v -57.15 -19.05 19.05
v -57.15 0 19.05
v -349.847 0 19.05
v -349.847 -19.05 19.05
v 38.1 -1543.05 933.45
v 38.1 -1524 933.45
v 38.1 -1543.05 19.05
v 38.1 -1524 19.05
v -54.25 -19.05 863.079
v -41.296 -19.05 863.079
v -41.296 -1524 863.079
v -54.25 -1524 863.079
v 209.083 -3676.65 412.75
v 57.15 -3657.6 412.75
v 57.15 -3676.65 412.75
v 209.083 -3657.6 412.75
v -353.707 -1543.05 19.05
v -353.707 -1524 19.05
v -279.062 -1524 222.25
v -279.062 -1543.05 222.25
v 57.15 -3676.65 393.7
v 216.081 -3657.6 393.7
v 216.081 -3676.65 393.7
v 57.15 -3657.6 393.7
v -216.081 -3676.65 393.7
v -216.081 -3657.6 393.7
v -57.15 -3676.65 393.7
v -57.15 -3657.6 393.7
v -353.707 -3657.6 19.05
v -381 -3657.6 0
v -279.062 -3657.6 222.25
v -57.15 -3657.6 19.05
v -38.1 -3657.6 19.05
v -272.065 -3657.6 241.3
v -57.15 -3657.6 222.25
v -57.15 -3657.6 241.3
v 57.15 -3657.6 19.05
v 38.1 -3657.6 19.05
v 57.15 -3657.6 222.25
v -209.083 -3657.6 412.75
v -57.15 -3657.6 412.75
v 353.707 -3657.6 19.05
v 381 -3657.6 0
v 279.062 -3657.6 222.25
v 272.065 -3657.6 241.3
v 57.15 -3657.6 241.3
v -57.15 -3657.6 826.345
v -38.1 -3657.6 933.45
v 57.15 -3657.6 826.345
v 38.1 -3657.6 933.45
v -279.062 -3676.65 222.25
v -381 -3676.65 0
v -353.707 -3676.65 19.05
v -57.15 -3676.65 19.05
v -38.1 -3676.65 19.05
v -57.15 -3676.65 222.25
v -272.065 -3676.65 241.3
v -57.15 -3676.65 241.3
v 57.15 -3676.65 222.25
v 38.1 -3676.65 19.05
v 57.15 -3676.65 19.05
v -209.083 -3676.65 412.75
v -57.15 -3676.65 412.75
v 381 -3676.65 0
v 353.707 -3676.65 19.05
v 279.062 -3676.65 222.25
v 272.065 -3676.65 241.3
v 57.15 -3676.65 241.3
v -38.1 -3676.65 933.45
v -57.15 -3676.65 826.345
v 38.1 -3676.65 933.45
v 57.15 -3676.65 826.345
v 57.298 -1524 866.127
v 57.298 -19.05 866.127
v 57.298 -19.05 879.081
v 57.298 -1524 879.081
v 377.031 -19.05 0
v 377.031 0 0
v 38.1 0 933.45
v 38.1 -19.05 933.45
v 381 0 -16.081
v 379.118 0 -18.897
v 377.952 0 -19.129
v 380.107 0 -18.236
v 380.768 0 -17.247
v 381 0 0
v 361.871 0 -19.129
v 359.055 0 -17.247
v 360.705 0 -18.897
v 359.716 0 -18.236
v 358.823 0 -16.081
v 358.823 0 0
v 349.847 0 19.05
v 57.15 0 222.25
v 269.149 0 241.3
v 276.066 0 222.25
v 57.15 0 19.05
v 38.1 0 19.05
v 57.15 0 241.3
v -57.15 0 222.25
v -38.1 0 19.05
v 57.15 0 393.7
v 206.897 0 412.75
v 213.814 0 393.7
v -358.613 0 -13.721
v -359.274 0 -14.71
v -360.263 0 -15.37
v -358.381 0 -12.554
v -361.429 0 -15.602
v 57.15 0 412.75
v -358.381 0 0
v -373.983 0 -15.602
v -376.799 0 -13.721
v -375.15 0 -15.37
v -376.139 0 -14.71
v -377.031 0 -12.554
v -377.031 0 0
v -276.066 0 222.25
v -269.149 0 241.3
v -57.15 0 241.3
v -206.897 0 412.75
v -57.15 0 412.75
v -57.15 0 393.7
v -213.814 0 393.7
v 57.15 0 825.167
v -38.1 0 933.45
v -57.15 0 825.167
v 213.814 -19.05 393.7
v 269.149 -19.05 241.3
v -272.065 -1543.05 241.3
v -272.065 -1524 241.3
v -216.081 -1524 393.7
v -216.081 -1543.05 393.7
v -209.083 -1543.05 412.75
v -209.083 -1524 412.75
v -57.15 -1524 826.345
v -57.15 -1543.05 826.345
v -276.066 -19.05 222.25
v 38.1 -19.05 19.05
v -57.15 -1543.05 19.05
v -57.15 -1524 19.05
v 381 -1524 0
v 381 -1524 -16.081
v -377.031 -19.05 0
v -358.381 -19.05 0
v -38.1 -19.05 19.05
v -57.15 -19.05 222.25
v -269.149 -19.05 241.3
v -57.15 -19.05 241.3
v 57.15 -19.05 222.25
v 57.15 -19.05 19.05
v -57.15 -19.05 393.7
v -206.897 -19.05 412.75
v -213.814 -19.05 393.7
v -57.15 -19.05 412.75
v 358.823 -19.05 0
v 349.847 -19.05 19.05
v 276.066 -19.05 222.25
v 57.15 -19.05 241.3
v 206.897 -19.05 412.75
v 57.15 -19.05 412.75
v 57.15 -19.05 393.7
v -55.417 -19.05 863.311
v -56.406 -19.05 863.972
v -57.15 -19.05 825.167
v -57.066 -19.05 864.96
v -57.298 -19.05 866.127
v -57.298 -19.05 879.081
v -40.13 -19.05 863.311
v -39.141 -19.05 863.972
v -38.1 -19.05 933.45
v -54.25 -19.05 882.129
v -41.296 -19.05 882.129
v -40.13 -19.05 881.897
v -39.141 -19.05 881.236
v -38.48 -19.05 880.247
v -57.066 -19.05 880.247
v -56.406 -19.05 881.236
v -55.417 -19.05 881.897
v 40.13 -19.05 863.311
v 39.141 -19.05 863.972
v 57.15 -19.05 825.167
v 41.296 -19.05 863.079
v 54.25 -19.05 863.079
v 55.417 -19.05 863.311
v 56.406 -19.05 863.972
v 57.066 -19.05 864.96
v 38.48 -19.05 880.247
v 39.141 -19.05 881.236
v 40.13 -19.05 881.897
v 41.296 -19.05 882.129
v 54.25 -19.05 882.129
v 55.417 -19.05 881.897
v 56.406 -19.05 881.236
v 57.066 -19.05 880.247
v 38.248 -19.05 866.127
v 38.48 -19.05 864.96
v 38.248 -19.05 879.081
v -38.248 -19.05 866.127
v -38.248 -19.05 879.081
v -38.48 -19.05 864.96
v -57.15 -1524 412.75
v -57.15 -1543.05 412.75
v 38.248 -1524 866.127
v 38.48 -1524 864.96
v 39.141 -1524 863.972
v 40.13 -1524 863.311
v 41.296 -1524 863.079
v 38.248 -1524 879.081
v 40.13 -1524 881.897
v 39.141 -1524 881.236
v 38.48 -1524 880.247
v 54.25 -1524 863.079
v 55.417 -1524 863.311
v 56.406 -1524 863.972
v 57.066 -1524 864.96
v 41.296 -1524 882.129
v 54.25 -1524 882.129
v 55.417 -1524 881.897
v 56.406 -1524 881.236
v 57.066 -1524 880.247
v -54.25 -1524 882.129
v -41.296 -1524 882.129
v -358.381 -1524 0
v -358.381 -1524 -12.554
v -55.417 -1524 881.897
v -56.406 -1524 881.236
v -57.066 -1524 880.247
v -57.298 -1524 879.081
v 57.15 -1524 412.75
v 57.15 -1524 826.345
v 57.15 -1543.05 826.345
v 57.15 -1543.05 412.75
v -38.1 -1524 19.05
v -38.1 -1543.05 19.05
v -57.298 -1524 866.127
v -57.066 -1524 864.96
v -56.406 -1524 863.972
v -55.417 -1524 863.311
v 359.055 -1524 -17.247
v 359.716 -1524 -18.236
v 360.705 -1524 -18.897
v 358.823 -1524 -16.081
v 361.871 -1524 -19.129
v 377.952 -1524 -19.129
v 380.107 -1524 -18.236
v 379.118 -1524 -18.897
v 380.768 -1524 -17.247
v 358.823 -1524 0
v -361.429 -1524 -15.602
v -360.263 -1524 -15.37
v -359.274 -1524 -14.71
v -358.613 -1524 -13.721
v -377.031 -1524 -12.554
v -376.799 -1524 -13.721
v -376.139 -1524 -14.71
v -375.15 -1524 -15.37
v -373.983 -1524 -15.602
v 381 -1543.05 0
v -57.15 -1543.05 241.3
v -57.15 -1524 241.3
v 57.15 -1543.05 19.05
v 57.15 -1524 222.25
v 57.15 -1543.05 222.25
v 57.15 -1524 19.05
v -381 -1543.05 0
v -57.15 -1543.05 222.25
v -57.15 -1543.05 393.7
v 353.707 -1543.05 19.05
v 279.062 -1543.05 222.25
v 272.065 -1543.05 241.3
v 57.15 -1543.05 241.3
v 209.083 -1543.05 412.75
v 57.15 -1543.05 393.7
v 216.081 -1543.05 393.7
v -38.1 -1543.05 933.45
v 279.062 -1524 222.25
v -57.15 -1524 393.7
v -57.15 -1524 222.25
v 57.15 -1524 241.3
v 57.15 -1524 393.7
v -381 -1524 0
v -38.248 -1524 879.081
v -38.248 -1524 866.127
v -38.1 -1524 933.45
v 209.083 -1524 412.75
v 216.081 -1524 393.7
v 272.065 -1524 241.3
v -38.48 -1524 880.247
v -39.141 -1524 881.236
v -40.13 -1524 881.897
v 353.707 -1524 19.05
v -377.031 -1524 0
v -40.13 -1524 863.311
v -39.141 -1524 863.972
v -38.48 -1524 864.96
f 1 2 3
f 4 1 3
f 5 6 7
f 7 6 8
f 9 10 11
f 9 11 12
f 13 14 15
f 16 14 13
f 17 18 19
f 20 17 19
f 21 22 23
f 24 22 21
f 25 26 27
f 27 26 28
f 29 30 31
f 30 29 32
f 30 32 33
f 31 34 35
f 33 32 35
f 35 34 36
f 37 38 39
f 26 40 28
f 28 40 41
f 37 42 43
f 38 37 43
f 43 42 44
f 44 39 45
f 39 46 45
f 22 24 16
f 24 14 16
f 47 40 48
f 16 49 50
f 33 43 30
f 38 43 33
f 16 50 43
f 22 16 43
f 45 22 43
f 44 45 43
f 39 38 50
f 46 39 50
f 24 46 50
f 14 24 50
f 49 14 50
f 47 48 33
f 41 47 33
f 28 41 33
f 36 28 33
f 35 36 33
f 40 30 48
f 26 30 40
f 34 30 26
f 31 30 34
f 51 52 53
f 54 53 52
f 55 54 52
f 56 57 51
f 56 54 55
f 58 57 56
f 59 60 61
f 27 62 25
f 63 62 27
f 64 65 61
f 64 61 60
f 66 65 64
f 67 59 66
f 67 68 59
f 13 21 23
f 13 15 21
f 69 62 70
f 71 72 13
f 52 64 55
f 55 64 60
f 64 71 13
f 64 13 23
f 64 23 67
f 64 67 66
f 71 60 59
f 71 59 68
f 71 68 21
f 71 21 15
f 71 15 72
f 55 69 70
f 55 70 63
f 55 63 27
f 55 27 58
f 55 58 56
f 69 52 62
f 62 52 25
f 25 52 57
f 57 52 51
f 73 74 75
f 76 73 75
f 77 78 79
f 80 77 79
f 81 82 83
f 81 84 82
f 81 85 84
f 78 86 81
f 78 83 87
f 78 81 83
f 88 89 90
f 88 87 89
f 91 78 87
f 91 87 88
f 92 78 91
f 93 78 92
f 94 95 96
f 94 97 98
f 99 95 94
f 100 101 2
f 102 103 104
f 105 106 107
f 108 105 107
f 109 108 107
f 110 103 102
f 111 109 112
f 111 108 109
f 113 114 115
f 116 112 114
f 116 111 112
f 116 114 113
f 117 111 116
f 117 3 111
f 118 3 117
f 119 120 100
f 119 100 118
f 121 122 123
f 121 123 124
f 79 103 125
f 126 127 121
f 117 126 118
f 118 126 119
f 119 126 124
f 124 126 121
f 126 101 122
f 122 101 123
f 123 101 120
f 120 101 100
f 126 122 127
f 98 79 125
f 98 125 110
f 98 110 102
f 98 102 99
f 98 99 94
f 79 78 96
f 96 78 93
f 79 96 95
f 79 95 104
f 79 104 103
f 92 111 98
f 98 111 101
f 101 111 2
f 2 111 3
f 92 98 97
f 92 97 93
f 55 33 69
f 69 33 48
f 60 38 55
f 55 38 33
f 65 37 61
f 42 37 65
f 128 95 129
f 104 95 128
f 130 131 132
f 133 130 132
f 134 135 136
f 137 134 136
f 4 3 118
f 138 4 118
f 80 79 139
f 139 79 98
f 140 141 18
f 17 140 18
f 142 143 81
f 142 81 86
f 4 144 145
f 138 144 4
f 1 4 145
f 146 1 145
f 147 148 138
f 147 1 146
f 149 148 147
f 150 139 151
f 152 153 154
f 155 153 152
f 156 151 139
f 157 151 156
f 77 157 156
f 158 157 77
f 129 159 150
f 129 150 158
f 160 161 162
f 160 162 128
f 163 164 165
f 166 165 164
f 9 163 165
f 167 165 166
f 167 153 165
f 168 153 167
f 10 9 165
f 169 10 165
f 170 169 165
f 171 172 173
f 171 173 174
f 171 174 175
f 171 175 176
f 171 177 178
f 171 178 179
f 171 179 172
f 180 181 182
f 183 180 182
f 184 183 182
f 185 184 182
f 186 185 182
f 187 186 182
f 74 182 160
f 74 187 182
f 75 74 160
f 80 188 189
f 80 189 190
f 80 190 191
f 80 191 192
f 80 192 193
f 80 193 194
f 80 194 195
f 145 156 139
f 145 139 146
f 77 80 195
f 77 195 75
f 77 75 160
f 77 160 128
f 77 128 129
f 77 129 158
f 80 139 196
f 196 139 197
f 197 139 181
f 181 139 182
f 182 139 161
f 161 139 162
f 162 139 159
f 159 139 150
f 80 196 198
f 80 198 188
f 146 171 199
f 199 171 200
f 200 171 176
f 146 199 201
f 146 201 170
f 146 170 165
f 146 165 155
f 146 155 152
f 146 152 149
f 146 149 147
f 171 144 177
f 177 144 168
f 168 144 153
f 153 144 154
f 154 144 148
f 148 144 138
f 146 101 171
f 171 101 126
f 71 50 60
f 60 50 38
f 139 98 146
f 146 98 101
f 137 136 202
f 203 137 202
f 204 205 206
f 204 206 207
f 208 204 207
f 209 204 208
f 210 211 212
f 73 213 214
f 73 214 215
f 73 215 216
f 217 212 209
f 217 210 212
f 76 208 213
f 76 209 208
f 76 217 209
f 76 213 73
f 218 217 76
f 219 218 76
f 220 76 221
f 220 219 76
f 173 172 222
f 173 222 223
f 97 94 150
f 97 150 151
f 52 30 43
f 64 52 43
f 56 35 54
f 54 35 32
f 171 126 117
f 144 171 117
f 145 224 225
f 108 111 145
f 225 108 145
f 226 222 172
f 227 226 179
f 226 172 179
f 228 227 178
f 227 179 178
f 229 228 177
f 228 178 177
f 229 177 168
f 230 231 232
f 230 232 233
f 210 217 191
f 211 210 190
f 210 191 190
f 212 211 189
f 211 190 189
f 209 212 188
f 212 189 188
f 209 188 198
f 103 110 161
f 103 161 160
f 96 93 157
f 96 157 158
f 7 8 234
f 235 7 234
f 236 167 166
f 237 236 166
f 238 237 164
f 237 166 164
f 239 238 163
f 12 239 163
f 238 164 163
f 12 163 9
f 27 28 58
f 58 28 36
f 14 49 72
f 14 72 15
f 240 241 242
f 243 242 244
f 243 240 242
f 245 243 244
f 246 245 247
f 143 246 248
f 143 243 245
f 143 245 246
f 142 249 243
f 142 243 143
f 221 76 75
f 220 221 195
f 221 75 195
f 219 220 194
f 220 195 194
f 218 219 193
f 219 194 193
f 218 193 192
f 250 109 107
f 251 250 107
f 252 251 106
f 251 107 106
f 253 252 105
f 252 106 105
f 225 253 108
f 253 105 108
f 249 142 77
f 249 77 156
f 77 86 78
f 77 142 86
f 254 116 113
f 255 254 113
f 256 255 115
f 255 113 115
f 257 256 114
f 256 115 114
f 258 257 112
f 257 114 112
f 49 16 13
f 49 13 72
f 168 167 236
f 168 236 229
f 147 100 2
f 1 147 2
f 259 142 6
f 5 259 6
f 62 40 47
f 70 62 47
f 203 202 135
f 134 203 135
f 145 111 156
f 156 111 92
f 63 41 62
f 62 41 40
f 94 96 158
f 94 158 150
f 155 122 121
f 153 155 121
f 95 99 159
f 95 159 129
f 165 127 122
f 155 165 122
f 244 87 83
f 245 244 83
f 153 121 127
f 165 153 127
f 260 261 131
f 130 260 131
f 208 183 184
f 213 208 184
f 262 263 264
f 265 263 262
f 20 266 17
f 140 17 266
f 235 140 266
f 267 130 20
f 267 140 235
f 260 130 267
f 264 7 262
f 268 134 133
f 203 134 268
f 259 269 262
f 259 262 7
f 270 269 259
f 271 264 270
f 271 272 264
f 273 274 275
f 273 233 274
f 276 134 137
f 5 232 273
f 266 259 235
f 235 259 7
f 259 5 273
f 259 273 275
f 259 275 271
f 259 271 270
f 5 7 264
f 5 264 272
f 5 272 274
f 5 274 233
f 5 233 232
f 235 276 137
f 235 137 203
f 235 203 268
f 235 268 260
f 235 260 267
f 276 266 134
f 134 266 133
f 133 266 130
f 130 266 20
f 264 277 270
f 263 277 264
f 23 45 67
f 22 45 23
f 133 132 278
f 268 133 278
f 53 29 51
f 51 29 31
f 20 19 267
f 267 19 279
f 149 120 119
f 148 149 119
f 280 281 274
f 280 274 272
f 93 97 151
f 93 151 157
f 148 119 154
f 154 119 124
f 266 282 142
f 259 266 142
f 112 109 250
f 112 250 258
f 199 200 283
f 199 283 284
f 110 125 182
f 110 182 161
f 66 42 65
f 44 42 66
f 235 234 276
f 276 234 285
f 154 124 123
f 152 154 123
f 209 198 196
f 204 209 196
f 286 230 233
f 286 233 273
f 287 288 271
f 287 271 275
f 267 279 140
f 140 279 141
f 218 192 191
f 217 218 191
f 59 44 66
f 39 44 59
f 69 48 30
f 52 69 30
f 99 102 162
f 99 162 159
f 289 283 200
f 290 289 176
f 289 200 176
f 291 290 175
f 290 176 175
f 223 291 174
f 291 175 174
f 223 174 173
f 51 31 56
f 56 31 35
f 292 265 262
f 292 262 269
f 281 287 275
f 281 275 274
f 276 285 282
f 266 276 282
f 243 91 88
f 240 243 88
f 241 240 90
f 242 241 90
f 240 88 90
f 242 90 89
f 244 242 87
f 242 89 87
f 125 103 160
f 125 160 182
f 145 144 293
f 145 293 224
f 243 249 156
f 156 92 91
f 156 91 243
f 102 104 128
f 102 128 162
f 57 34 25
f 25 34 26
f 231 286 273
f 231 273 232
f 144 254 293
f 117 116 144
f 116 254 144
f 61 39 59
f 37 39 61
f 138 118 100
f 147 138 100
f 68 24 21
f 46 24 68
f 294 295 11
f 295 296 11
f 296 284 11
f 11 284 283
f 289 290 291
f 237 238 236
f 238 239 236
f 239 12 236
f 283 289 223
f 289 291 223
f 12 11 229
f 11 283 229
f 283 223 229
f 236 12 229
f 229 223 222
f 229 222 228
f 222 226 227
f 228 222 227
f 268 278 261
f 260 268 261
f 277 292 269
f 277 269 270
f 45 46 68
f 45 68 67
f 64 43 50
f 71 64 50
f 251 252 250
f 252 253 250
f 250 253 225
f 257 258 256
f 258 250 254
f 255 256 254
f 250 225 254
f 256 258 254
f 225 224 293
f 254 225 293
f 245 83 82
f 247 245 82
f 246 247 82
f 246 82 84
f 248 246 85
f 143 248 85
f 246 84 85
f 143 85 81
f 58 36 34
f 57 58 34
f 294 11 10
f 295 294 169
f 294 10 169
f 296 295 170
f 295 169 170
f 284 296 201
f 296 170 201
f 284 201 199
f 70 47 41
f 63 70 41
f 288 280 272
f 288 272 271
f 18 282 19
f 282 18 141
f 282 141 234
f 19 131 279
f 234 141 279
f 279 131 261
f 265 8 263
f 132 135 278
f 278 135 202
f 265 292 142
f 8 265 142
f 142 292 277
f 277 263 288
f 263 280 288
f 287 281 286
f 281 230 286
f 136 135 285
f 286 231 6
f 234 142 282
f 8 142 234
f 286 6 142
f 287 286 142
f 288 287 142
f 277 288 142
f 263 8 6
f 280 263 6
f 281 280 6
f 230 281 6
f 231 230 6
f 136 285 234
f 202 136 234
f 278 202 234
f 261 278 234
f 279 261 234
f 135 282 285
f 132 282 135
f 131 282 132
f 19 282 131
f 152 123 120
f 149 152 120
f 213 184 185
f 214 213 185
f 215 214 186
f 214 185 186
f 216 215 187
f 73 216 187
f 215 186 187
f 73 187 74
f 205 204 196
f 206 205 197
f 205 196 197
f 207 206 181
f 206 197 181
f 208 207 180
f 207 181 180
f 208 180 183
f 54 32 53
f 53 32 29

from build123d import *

# Parameters (mm, degrees)
PAD_DEPTH    = 19.05
PAD003_DEPTH = 1524
PAD001_DEPTH = 19.05
PAD002_DEPTH = 19.05


with BuildPart() as body:
    # Sketch → Pad (new body)
    with BuildSketch(Plane.XZ):
        Polygon((-377.03125, 0), (377.03125, 0), (38.1, 933.45), (38.1, 19.05), (-38.1, 19.05), (-38.1, 933.45), align=None)
        Polygon((-276.066442, 222.25), (-57.15, 222.25), (-57.15, 19.05), (-349.847394, 19.05), align=None, mode=Mode.SUBTRACT)
        Polygon((-269.149477, 241.3), (-213.813763, 393.7), (-57.15, 393.7), (-57.15, 241.3), align=None, mode=Mode.SUBTRACT)
        Polygon((-206.896799, 412.75), (-57.15, 825.167413), (-57.15, 412.75), align=None, mode=Mode.SUBTRACT)
        Polygon((57.15, 19.05), (349.847394, 19.05), (276.066442, 222.25), (57.15, 222.25), align=None, mode=Mode.SUBTRACT)
        Polygon((57.15, 241.3), (269.149477, 241.3), (213.813763, 393.7), (57.15, 393.7), align=None, mode=Mode.SUBTRACT)
        Polygon((57.15, 412.75), (206.896799, 412.75), (57.15, 825.167413), align=None, mode=Mode.SUBTRACT)
    extrude(amount=PAD_DEPTH)

    # Sketch003 → Pad003 (join)
    with BuildSketch(Plane.XZ):
        with BuildLine():
            Line((-377.03125, 0), (-358.380943, 0))
            Line((-358.380943, 0), (-358.380943, -12.554307))
            ThreePointArc((-361.428943, -15.602307), (-359.273682, -14.709568), (-358.380943, -12.554307))
            Line((-361.428943, -15.602307), (-373.98325, -15.602307))
            ThreePointArc((-377.03125, -12.554307), (-376.138511, -14.709568), (-373.98325, -15.602307))
            Line((-377.03125, -12.554307), (-377.03125, 0))
        make_face()
        with BuildLine():
            Line((381, 0), (358.823071, 0))
            Line((358.823071, 0), (358.823071, -16.080929))
            ThreePointArc((358.823071, -16.080929), (359.71581, -18.23619), (361.871071, -19.128929))
            Line((361.871071, -19.128929), (377.952, -19.128929))
            ThreePointArc((377.952, -19.128929), (380.107261, -18.23619), (381, -16.080929))
            Line((381, -16.080929), (381, 0))
        make_face()
        with BuildLine():
            Line((54.250448, 882.128777), (41.296448, 882.128777))
            ThreePointArc((41.296448, 882.128777), (39.141187, 881.236039), (38.248448, 879.080777))
            Line((38.248448, 879.080777), (38.248448, 866.126777))
            ThreePointArc((38.248448, 866.126777), (39.141187, 863.971516), (41.296448, 863.078777))
            Line((41.296448, 863.078777), (54.250448, 863.078777))
            ThreePointArc((54.250448, 863.078777), (56.40571, 863.971516), (57.298448, 866.126777))
            Line((57.298448, 866.126777), (57.298448, 879.080777))
            ThreePointArc((57.298448, 879.080777), (56.40571, 881.236039), (54.250448, 882.128777))
        make_face()
        with BuildLine():
            Line((-54.250448, 882.128777), (-41.296448, 882.128777))
            ThreePointArc((-38.248448, 879.080777), (-39.141187, 881.236039), (-41.296448, 882.128777))
            Line((-38.248448, 879.080777), (-38.248448, 866.126777))
            ThreePointArc((-41.296448, 863.078777), (-39.141187, 863.971516), (-38.248448, 866.126777))
            Line((-41.296448, 863.078777), (-54.250448, 863.078777))
            ThreePointArc((-57.298448, 866.126777), (-56.40571, 863.971516), (-54.250448, 863.078777))
            Line((-57.298448, 866.126777), (-57.298448, 879.080777))
            ThreePointArc((-54.250448, 882.128777), (-56.40571, 881.236039), (-57.298448, 879.080777))
        make_face()
    extrude(amount=PAD003_DEPTH)


with BuildPart() as pad001:
    # Sketch001 → Pad001 (new body)
    with BuildSketch(Plane.XZ.offset(1524)):
        Polygon((-381, 0), (381, 0), (38.1, 933.45), (38.1, 19.05), (-38.1, 19.05), (-38.1, 933.45), align=None)
        Polygon((-279.062465, 222.25), (-57.15, 222.25), (-57.15, 19.05), (-353.707363, 19.05), align=None, mode=Mode.SUBTRACT)
        Polygon((-272.064506, 241.3), (-216.080833, 393.7), (-57.15, 393.7), (-57.15, 241.3), align=None, mode=Mode.SUBTRACT)
        Polygon((-209.082874, 412.75), (-57.15, 826.345045), (-57.15, 412.75), align=None, mode=Mode.SUBTRACT)
        Polygon((57.15, 19.05), (353.707363, 19.05), (279.062465, 222.25), (57.15, 222.25), align=None, mode=Mode.SUBTRACT)
        Polygon((57.15, 241.3), (272.064506, 241.3), (216.080833, 393.7), (57.15, 393.7), align=None, mode=Mode.SUBTRACT)
        Polygon((57.15, 412.75), (209.082874, 412.75), (57.15, 826.345045), align=None, mode=Mode.SUBTRACT)
    extrude(amount=PAD001_DEPTH)


with BuildPart() as pad002:
    # Sketch002 → Pad002 (new body)
    with BuildSketch(Plane.XZ.offset(3657.6)):
        Polygon((-381, 0), (381, 0), (38.1, 933.45), (38.1, 19.05), (-38.1, 19.05), (-38.1, 933.45), align=None)
        Polygon((-279.062465, 222.25), (-57.15, 222.25), (-57.15, 19.05), (-353.707363, 19.05), align=None, mode=Mode.SUBTRACT)
        Polygon((-272.064506, 241.3), (-216.080833, 393.7), (-57.15, 393.7), (-57.15, 241.3), align=None, mode=Mode.SUBTRACT)
        Polygon((-209.082874, 412.75), (-57.15, 826.345045), (-57.15, 412.75), align=None, mode=Mode.SUBTRACT)
        Polygon((57.15, 19.05), (353.707363, 19.05), (279.062465, 222.25), (57.15, 222.25), align=None, mode=Mode.SUBTRACT)
        Polygon((57.15, 241.3), (272.064506, 241.3), (216.080833, 393.7), (57.15, 393.7), align=None, mode=Mode.SUBTRACT)
        Polygon((57.15, 412.75), (209.082874, 412.75), (57.15, 826.345045), align=None, mode=Mode.SUBTRACT)
    extrude(amount=PAD002_DEPTH)


solid = Compound([body.part, pad001.part, pad002.part])
